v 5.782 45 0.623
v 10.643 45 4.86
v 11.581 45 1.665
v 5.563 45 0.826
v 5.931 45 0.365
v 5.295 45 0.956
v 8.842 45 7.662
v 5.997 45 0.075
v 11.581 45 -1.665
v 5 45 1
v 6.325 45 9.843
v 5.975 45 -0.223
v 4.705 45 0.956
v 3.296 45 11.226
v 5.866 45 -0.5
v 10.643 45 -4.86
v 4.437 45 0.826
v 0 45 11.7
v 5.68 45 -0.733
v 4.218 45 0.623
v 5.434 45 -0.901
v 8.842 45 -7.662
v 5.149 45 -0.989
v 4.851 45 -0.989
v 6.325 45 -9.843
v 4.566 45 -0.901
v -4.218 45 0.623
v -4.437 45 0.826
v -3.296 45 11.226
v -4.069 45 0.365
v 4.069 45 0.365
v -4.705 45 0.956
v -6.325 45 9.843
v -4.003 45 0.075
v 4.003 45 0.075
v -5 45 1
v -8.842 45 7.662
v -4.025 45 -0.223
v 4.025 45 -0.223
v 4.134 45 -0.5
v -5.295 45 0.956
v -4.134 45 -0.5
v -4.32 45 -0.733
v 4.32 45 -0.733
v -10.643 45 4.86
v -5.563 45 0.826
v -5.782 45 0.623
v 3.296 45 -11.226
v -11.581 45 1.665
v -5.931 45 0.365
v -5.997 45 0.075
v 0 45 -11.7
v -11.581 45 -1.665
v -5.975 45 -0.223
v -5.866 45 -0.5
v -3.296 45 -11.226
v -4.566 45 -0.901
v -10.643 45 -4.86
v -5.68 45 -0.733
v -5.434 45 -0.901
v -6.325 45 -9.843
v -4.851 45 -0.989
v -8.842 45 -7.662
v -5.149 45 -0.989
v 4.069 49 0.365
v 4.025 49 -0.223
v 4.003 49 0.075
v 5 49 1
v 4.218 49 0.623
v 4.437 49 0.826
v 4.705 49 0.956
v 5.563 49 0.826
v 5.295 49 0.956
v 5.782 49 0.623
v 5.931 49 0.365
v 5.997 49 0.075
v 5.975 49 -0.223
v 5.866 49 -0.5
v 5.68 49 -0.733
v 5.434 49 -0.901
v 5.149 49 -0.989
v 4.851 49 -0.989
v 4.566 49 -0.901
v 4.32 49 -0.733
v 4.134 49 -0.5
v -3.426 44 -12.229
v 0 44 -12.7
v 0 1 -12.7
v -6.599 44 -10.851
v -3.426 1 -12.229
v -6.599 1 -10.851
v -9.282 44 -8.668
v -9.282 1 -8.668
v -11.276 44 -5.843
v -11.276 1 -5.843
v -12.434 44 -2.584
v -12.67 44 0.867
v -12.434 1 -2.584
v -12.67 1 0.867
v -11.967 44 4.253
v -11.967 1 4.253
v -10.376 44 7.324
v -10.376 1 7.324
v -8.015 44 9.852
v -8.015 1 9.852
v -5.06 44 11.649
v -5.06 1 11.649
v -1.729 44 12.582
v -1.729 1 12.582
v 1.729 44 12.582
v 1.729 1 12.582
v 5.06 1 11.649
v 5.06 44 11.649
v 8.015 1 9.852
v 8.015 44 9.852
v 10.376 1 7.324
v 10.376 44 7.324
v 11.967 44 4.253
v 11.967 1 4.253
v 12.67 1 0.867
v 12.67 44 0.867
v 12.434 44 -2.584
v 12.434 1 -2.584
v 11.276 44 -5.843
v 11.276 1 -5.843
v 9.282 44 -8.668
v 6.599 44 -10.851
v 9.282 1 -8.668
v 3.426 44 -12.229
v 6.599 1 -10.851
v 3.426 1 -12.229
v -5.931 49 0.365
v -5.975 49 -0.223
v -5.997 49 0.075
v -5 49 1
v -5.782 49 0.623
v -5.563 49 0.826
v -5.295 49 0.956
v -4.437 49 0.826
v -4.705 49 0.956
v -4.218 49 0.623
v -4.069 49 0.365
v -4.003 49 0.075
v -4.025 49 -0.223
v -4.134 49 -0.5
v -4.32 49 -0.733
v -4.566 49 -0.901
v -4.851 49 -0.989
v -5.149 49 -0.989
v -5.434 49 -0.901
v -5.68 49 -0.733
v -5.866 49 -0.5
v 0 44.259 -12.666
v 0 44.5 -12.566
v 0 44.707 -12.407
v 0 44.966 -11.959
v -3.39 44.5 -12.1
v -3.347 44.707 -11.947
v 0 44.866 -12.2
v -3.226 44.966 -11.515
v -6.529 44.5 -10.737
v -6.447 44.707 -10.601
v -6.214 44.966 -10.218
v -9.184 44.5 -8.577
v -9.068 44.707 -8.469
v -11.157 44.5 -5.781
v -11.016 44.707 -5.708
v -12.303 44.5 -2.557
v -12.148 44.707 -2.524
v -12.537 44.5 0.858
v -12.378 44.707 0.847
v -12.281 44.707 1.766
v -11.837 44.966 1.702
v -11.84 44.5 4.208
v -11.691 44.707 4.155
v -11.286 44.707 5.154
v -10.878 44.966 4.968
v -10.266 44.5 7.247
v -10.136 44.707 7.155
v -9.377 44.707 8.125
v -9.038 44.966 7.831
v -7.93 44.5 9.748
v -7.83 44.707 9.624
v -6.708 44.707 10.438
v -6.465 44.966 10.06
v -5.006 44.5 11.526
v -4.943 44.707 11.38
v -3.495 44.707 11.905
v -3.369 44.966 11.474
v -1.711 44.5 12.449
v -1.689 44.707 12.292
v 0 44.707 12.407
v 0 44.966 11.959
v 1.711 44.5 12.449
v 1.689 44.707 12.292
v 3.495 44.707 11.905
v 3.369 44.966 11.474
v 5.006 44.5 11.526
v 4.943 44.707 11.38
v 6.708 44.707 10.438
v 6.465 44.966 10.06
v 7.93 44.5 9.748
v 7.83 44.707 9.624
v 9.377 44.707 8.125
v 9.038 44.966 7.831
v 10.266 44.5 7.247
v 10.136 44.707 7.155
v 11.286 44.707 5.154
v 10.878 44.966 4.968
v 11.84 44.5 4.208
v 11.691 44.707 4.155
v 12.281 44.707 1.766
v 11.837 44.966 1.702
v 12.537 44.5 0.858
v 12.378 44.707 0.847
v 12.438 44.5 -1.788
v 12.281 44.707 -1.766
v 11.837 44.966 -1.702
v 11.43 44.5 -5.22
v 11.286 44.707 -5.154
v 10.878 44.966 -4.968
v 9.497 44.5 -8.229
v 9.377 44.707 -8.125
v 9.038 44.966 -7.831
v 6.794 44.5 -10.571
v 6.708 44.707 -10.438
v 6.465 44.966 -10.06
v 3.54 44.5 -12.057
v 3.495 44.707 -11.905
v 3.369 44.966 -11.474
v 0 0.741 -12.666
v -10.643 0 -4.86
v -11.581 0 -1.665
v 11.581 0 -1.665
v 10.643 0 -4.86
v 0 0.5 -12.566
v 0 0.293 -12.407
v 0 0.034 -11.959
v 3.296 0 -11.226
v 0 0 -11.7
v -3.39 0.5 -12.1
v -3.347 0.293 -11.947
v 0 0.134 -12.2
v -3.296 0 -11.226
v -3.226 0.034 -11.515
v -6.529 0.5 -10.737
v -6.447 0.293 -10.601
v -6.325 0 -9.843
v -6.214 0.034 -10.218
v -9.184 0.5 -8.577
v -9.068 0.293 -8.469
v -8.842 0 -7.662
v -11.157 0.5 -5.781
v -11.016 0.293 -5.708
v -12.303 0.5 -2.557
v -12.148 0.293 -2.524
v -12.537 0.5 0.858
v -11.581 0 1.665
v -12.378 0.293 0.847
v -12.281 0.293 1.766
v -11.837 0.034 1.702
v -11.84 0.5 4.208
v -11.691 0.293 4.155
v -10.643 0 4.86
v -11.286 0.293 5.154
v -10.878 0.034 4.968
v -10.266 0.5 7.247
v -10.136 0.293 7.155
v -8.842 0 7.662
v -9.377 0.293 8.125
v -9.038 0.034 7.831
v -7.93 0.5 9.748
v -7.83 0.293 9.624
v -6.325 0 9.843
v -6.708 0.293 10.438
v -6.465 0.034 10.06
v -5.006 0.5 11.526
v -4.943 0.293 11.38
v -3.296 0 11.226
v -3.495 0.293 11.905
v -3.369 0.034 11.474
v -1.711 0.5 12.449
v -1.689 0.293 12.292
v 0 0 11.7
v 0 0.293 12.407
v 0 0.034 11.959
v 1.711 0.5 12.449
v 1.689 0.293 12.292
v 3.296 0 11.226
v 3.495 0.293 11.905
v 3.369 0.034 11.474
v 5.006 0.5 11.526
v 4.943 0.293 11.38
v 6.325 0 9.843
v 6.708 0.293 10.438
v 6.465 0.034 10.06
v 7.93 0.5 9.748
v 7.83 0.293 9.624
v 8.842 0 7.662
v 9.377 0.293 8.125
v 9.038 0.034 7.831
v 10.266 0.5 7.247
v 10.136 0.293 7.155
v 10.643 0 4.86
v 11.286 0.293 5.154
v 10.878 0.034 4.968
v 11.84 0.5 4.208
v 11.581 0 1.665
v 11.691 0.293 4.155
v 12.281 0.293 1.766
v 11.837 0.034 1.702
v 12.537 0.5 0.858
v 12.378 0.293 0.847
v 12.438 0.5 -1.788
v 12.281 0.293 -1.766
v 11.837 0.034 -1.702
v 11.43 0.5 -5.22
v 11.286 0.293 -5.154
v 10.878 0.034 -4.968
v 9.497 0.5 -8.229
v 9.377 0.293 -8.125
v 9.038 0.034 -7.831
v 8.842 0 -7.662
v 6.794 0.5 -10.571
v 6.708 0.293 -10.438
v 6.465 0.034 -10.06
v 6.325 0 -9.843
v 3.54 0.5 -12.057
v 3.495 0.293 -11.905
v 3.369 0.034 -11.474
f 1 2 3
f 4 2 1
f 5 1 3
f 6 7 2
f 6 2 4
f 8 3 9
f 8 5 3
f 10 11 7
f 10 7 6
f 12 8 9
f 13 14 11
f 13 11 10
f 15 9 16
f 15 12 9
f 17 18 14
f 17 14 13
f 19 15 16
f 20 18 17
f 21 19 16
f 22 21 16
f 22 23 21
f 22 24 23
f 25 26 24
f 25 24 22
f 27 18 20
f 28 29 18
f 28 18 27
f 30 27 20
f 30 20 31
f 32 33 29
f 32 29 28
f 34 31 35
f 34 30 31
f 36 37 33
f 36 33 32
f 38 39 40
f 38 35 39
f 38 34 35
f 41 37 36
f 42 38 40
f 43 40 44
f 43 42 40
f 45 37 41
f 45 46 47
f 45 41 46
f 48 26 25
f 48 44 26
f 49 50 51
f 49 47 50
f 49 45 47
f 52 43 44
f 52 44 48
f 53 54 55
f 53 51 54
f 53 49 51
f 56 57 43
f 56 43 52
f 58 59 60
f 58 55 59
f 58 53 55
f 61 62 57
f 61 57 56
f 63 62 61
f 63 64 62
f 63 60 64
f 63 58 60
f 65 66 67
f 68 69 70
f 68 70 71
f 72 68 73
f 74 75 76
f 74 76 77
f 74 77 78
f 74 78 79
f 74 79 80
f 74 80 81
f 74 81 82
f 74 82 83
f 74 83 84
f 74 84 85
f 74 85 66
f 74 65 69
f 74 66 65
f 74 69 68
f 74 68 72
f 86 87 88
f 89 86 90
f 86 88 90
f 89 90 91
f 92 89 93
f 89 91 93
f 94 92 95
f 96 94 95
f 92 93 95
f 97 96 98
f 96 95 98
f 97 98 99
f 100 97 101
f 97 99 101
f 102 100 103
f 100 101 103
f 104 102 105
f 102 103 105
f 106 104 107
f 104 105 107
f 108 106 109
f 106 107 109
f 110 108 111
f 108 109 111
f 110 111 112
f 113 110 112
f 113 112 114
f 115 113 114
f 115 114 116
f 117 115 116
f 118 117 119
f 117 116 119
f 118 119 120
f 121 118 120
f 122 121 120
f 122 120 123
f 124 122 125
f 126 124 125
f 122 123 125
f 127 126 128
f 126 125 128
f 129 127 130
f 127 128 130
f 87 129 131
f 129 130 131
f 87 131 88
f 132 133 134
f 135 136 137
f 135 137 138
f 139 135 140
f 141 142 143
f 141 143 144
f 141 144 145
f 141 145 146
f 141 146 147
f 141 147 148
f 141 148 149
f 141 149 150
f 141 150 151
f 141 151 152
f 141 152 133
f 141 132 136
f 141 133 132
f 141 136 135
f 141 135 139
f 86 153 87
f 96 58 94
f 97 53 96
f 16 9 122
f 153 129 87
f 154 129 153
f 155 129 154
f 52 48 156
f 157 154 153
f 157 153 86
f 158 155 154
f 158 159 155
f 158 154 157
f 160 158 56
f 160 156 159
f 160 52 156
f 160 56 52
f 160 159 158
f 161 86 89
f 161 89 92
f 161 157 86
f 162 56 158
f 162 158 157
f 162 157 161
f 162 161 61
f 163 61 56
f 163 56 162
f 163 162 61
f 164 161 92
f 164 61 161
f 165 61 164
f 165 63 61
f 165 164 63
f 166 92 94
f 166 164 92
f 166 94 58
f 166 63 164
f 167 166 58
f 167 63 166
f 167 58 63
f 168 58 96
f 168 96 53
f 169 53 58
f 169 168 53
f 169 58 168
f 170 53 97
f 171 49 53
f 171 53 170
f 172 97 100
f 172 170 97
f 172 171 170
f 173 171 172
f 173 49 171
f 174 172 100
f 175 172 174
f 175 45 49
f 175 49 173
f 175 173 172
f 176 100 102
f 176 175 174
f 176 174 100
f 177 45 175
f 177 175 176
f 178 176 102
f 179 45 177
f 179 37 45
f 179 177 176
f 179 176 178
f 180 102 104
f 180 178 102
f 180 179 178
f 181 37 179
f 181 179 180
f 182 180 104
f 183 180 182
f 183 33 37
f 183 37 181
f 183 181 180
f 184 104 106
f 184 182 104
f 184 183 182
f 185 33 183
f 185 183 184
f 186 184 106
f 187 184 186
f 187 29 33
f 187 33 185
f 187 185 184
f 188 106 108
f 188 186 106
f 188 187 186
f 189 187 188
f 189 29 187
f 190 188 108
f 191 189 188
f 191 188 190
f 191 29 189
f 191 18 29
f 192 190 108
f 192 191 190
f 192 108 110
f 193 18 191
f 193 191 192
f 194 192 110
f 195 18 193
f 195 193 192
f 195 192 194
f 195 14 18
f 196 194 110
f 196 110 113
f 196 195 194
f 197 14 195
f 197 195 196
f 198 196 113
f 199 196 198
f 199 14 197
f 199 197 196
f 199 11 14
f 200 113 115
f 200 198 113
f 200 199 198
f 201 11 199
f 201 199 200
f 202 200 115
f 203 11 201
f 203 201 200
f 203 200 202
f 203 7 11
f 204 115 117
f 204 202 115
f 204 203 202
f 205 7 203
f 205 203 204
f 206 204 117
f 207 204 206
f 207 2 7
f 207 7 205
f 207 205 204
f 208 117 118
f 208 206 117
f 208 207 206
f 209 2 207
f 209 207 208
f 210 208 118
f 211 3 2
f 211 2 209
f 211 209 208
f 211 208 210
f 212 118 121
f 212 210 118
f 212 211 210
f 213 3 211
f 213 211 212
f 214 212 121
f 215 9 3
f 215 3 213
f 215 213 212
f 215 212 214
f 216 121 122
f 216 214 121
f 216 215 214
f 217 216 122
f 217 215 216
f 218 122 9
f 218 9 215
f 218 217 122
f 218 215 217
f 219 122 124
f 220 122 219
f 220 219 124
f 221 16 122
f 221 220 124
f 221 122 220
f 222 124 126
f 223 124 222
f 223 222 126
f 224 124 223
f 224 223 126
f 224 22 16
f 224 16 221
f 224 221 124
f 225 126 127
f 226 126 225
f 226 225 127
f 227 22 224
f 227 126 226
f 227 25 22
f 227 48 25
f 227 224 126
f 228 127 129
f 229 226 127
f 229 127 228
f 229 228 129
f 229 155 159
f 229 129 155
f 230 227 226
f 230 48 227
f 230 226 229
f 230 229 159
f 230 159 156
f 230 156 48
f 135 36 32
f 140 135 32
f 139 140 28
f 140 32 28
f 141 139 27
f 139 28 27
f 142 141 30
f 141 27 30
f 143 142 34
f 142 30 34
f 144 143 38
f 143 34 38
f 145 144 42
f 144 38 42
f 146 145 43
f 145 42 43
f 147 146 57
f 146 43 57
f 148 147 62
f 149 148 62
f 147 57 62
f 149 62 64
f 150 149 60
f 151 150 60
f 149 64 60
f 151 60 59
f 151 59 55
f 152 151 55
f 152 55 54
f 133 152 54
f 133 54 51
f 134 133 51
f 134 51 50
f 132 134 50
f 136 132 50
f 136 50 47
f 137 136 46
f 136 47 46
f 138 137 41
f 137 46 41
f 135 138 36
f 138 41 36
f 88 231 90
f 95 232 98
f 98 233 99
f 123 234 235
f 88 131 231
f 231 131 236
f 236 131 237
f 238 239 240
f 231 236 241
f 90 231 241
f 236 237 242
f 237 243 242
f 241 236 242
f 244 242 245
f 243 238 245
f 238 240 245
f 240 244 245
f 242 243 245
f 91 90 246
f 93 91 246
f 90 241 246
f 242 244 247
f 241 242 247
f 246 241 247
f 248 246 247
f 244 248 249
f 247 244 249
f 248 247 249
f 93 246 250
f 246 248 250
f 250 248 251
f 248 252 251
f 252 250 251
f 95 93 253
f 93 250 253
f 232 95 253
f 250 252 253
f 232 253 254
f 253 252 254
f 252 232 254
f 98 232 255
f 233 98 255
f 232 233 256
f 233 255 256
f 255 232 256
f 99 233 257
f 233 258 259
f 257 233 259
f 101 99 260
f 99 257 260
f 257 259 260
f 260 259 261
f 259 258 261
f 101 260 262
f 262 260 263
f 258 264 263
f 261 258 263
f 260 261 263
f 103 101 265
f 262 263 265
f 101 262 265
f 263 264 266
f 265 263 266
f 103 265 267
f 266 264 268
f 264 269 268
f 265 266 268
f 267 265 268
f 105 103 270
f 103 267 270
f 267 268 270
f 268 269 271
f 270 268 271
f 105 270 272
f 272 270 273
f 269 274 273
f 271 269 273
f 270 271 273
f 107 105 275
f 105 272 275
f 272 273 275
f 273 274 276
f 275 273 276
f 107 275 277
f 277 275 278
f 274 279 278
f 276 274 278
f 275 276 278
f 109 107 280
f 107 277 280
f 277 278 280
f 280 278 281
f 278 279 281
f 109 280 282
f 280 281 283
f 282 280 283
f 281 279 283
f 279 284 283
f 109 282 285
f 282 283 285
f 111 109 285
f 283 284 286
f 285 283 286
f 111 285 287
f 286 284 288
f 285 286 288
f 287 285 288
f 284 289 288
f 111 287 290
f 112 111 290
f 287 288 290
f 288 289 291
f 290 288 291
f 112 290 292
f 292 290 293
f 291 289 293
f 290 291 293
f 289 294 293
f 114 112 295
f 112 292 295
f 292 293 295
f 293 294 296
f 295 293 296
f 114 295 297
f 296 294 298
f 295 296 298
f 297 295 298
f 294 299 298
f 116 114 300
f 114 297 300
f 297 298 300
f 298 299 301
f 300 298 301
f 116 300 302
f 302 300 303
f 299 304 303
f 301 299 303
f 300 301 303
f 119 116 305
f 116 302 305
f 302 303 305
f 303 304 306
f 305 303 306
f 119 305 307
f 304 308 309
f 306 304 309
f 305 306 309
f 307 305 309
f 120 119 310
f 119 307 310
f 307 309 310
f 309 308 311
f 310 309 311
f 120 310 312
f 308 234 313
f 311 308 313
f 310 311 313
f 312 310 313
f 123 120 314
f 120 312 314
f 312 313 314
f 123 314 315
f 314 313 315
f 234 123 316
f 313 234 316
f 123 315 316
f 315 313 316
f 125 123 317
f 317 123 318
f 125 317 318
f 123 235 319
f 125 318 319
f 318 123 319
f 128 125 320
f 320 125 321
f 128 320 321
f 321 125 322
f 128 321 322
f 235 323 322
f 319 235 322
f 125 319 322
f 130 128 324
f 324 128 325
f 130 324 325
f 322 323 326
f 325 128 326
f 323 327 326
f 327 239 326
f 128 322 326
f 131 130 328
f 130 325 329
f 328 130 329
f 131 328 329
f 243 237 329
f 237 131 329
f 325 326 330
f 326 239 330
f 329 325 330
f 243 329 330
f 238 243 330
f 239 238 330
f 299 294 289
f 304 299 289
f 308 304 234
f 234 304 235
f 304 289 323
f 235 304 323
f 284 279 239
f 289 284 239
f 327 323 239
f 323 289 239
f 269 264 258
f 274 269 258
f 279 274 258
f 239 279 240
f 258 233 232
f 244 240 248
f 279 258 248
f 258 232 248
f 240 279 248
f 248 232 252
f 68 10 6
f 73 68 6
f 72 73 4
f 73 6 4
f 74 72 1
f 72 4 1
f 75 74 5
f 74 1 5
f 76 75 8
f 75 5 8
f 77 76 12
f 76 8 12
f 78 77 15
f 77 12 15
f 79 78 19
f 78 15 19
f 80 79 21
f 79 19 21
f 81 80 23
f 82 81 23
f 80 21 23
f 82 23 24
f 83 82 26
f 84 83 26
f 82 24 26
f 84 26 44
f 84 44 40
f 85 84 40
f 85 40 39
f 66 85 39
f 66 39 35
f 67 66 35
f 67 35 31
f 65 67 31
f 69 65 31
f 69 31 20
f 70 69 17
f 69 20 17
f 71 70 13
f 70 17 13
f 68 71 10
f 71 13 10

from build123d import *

# Parameters (mm, degrees)
ESBO_O1_R                = 12.7
RESSALTO_EXTRUS_O1_DEPTH = 45
FILETE1_R                = 1
ESBO_O2_R                = 1
RESSALTO_EXTRUS_O2_DEPTH = 4


with BuildPart() as part:
    # Esboço1 → Ressalto-extrusão1 (new body)
    with BuildSketch(Plane(origin=(0, 0, 0), x_dir=(1, 0, 0), z_dir=(0, 1, 0))):
        with Locations(Location((0, 0, 0), (0, 0, 90))):
            Circle(ESBO_O1_R)
    extrude(amount=RESSALTO_EXTRUS_O1_DEPTH)

    # Filete1
    filete1_edges = [part.edges().sort_by_distance(p)[0] for p in [
        (0, 0, 12.7),
        (0, 45, 12.7),
    ]]
    fillet(filete1_edges, radius=FILETE1_R)

    # Esboço2 → Ressalto-extrusão2 (add)
    with BuildSketch(Plane(origin=(0, 45, 0), x_dir=(1, 0, 0), z_dir=(0, 1, 0))):
        with Locations(Location((5, 0, 0), (0, 0, 270))):
            Circle(ESBO_O2_R)
        with Locations(Location((-5, 0, 0), (0, 0, 270))):
            Circle(ESBO_O2_R)
    extrude(amount=RESSALTO_EXTRUS_O2_DEPTH)


solid = part.part
